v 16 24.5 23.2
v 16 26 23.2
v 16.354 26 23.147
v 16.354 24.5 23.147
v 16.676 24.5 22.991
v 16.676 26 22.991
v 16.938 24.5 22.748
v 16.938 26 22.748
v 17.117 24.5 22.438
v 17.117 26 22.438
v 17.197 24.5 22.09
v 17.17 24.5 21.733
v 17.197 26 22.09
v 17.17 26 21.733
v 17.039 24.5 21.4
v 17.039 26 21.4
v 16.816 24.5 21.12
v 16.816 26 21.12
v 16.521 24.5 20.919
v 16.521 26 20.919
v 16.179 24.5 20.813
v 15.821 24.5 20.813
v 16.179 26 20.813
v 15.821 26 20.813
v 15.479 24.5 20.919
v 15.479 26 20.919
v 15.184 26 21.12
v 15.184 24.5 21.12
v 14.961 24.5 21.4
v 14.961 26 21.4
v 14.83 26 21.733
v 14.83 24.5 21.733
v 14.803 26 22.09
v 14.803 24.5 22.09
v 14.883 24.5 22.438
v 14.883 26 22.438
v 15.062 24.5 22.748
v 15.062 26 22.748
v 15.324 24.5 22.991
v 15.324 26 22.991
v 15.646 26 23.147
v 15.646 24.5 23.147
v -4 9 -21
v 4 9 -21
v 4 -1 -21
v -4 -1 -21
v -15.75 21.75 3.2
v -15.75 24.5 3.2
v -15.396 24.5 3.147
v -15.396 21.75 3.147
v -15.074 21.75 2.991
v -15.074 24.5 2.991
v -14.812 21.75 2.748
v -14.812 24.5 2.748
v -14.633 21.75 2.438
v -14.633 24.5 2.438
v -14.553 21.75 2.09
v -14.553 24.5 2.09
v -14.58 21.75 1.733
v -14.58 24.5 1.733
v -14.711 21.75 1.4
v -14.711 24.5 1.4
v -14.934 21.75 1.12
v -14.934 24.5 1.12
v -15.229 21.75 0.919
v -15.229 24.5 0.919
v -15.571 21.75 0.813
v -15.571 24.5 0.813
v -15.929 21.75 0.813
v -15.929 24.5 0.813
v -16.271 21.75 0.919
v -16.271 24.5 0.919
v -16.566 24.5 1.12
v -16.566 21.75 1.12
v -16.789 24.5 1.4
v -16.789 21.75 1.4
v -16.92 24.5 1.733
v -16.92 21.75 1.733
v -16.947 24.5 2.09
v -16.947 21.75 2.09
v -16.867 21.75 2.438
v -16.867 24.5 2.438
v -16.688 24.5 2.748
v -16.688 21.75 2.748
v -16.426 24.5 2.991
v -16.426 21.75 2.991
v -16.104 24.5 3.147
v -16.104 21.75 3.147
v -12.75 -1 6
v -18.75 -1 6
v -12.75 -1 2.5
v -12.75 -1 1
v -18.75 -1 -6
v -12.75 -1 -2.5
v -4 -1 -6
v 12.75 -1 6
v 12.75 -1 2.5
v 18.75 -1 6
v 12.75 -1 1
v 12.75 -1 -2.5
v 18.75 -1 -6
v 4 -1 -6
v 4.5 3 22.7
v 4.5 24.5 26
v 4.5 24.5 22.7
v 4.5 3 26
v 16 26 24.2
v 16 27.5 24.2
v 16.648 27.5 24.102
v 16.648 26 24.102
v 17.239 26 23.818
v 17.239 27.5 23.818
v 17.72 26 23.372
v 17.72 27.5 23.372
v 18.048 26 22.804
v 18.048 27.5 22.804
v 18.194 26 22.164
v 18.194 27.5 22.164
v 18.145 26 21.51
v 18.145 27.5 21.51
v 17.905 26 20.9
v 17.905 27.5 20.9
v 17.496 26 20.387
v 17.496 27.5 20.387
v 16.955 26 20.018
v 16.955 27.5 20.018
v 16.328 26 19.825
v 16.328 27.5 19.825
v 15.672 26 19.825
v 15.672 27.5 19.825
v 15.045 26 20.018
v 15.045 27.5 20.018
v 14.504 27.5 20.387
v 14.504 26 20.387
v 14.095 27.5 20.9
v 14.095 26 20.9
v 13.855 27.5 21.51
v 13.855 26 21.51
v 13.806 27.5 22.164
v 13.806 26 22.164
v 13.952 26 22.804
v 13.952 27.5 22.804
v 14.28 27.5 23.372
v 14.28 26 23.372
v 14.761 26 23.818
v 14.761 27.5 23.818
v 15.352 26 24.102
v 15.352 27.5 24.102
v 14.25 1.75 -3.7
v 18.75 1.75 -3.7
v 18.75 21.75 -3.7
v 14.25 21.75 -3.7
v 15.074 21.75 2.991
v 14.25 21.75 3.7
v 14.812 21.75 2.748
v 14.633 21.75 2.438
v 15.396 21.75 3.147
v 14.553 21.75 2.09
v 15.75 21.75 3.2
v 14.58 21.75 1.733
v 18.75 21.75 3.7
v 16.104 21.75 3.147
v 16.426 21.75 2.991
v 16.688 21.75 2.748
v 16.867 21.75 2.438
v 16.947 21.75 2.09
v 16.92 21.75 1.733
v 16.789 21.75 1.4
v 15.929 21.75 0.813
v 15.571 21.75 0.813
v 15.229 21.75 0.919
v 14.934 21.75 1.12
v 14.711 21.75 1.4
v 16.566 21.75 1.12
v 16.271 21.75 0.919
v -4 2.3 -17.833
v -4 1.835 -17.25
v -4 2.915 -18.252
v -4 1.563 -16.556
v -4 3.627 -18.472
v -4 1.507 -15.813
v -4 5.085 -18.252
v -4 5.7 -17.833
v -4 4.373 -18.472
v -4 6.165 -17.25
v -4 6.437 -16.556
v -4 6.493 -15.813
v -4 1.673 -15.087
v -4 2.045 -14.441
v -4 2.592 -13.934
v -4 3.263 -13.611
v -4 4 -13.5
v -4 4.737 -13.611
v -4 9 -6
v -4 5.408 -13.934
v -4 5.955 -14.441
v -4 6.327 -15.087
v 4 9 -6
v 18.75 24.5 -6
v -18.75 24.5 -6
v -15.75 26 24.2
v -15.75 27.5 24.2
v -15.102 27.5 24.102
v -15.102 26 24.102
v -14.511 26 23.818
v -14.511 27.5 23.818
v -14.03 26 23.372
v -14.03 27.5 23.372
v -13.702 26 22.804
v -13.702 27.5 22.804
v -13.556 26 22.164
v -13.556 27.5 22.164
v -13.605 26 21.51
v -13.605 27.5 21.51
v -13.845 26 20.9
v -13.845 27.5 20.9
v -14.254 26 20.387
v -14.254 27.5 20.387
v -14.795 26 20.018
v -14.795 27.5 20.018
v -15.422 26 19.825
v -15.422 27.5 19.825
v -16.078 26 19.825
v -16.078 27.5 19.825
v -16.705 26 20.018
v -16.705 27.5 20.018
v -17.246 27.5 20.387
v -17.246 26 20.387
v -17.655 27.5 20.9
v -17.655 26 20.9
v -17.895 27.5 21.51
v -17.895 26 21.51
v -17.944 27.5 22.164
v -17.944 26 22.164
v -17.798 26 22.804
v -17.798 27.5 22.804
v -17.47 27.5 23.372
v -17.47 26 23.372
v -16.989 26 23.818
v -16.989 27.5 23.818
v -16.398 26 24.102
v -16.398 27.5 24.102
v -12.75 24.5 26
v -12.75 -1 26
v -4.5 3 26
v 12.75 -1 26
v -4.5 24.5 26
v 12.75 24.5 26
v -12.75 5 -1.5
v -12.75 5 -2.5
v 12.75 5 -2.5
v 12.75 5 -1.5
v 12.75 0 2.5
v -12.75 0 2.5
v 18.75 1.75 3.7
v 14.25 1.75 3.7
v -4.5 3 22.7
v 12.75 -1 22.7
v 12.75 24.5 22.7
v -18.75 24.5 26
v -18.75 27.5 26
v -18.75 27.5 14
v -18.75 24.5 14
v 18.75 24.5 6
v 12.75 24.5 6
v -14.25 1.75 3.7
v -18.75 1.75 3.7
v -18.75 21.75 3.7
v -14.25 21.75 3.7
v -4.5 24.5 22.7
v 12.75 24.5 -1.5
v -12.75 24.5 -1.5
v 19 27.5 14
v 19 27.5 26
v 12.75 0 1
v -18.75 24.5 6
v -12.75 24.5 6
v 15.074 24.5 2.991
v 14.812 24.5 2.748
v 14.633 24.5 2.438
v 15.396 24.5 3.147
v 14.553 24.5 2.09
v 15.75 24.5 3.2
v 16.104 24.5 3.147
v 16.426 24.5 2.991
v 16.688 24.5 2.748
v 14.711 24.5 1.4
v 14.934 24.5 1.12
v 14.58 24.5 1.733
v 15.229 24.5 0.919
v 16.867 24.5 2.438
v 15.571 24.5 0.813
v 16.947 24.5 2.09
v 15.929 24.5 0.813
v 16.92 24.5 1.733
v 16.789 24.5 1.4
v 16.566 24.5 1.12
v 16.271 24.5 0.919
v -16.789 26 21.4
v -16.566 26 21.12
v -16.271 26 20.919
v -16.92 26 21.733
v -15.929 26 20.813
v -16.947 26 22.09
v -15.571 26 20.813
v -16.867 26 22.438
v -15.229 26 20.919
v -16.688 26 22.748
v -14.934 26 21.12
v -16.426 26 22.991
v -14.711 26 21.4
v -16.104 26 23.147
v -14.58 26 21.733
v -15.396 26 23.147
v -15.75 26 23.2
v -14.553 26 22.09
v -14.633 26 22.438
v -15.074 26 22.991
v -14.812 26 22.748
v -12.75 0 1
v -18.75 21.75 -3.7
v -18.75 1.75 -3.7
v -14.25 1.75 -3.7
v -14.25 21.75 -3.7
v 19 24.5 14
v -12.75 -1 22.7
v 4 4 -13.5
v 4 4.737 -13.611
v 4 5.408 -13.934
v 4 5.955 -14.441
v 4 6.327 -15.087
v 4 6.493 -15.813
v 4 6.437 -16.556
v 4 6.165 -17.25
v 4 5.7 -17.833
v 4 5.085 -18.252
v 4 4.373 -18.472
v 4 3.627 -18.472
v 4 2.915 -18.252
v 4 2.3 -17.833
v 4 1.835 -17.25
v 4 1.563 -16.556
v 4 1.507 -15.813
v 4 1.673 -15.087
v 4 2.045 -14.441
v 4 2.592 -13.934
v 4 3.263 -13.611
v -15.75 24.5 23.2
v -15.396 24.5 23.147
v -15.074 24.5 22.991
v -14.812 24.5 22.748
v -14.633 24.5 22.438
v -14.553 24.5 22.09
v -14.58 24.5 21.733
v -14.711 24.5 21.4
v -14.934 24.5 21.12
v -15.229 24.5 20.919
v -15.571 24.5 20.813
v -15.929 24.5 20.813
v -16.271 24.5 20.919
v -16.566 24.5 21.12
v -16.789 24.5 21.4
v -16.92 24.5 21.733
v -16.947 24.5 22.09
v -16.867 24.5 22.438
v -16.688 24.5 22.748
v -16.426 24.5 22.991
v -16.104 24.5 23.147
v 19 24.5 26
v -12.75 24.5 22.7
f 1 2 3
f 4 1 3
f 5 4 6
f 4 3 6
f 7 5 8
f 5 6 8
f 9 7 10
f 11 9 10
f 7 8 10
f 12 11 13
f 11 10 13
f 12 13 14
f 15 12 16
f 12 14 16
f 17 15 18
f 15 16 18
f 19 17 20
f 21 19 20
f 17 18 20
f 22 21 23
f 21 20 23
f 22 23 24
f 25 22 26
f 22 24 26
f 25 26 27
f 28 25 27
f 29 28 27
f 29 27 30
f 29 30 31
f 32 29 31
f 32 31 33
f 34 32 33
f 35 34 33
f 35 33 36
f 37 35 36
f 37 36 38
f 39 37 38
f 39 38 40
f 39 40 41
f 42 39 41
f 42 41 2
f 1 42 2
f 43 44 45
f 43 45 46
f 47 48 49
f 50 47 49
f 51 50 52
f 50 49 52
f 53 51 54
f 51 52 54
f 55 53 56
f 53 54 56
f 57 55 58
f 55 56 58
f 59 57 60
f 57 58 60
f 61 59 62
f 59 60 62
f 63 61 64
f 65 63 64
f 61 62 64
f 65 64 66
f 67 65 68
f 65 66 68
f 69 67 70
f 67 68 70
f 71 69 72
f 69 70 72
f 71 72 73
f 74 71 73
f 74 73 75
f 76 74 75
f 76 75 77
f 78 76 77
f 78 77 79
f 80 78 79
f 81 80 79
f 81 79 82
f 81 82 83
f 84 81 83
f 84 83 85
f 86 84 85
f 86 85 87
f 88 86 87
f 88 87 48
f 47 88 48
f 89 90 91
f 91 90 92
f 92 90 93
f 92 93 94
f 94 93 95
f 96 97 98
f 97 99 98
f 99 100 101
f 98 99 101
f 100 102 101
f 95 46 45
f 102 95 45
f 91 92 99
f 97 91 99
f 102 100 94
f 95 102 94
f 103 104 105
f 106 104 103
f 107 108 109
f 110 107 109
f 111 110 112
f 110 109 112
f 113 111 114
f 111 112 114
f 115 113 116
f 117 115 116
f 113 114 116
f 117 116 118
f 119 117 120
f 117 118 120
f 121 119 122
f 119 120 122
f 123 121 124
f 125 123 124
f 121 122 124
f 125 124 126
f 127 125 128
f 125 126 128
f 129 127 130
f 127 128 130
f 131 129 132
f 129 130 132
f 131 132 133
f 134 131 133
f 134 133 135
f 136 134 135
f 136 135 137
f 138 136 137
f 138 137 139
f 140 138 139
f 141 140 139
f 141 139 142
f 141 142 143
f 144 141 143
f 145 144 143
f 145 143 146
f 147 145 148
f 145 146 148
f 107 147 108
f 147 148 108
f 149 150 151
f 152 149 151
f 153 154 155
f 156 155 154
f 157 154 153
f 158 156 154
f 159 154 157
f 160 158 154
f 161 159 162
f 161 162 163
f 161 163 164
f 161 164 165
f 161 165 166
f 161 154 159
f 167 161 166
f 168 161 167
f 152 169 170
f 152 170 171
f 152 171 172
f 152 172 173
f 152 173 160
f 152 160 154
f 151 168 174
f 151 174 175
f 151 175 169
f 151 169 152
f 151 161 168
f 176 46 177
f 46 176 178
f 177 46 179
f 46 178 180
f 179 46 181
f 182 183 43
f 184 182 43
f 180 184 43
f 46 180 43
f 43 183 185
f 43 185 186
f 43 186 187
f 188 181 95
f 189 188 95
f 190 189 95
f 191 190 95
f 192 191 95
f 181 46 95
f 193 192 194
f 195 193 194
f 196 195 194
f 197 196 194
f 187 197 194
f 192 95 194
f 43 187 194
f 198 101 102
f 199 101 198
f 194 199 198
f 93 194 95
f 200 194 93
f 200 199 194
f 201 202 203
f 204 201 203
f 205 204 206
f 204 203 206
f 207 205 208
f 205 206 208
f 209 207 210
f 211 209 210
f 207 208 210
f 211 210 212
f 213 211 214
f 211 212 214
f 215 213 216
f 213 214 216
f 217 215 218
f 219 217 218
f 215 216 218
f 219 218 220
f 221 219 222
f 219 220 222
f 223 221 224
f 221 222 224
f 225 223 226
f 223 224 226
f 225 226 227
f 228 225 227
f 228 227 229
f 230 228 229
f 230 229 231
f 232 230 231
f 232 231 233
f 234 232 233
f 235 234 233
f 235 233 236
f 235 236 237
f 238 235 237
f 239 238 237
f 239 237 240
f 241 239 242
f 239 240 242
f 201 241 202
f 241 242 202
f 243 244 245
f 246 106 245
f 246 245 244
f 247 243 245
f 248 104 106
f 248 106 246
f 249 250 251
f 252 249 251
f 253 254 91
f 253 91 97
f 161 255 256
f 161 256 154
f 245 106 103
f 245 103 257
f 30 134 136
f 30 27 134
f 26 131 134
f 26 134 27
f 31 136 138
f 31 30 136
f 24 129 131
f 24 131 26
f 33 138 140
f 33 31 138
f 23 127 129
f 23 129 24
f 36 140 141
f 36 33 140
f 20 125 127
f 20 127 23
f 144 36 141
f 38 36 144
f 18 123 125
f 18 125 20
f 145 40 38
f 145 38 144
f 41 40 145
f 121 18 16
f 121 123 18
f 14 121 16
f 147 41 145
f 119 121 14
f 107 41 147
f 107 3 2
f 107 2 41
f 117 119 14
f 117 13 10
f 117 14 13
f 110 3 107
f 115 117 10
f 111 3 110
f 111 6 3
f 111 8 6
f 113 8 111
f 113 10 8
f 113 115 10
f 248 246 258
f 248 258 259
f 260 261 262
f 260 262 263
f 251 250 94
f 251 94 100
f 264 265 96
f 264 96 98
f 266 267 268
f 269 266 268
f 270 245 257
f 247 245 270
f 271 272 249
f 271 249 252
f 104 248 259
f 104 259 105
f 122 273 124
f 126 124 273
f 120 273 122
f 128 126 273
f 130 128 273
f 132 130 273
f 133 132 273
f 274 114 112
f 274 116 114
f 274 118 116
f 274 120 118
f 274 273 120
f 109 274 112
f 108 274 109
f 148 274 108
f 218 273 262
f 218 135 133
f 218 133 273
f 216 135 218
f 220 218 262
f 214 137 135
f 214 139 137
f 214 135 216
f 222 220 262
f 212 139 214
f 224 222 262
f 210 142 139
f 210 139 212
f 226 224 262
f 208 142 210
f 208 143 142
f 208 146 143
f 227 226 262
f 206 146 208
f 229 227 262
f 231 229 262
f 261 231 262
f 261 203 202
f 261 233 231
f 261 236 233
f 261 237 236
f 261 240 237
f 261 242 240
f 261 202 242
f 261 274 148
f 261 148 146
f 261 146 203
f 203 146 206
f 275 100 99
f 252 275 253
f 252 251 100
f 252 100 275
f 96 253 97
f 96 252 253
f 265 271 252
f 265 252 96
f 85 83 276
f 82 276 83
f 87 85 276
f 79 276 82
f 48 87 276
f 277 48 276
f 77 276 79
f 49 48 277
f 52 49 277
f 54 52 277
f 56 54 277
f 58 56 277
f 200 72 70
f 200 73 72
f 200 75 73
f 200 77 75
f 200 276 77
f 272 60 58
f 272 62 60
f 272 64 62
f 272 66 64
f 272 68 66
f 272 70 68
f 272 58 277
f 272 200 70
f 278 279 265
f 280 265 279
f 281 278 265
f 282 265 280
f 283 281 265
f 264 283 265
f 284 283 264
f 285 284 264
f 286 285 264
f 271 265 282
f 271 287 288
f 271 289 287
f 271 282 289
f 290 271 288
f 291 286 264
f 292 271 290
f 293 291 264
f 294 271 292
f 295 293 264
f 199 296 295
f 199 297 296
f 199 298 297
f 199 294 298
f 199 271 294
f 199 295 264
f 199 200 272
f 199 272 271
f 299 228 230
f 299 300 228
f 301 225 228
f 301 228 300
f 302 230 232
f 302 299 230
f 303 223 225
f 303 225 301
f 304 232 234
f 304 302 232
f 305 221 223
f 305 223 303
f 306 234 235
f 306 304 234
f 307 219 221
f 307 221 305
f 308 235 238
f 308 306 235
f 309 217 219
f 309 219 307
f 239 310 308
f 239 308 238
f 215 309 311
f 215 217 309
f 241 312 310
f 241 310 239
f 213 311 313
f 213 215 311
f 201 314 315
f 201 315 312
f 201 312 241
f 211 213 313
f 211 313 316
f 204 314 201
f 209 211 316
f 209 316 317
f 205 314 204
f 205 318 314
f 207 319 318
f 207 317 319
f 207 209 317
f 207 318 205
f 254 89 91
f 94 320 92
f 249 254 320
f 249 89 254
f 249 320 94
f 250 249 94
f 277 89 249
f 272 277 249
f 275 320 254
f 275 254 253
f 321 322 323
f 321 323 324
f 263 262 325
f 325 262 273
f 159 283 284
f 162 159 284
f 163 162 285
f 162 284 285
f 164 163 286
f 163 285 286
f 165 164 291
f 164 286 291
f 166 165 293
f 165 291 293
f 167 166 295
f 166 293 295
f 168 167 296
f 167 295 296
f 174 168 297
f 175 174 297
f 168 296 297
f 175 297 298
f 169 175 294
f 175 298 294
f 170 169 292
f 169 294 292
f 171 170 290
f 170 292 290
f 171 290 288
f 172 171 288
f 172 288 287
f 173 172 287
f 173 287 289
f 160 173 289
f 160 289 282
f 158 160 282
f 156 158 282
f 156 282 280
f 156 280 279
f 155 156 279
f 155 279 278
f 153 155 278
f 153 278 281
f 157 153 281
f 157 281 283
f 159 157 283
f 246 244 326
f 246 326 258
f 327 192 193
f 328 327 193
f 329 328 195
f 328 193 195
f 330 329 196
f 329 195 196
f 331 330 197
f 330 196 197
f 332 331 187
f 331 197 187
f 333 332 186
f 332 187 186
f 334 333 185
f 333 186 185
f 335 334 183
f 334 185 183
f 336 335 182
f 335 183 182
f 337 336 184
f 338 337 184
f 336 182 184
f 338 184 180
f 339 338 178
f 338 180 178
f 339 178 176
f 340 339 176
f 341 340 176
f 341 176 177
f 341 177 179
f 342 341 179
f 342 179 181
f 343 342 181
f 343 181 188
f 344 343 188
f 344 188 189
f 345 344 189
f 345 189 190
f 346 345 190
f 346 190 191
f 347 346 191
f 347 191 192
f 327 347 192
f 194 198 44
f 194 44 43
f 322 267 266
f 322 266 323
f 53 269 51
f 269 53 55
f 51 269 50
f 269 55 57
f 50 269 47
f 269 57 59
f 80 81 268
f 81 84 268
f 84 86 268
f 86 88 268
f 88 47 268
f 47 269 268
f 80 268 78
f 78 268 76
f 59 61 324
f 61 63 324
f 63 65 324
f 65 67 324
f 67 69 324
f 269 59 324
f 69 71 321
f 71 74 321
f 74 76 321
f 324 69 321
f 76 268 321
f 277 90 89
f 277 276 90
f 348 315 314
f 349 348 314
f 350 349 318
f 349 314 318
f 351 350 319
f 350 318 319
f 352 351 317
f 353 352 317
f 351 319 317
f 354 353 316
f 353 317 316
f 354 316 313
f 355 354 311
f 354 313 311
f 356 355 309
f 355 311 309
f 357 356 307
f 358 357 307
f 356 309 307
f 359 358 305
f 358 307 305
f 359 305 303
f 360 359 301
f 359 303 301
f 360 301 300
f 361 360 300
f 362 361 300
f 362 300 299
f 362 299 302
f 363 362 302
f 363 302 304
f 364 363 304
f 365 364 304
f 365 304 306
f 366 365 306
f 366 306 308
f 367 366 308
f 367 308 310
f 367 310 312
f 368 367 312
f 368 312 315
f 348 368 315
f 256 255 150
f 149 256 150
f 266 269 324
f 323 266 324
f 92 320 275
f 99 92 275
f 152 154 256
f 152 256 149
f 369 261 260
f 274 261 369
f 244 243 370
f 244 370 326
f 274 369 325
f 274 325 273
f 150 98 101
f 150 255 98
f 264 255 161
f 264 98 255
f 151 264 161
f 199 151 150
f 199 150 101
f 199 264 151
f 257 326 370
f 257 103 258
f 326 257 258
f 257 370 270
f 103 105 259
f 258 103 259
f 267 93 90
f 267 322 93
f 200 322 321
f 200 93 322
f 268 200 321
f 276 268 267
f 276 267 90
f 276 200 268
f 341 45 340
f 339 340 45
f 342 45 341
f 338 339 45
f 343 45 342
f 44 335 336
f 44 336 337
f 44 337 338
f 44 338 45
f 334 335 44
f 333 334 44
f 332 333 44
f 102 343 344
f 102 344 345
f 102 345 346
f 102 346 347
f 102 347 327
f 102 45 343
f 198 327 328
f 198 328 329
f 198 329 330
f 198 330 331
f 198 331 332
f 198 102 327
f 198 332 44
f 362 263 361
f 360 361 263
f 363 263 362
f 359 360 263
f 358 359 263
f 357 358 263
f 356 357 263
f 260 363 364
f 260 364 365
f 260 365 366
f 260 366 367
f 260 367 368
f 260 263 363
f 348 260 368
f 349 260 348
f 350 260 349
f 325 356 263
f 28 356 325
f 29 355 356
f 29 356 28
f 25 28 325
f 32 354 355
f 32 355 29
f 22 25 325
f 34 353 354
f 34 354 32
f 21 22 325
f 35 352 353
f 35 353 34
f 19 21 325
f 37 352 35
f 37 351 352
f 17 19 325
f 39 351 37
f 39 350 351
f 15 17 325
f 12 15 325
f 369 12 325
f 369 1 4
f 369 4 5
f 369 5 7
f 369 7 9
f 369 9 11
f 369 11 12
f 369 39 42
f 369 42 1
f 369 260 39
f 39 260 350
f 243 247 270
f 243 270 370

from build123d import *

# Parameters (mm, degrees)
SKETCH1_W           = 25.5
SKETCH1_H           = 3.5
BOSS_EXTRUDE1_DEPTH = 24.5
SKETCH1_3_W         = 25.5
SKETCH1_3_H         = 1.5
SKETCH1_3_H_2       = 3.5
BOSS_EXTRUDE2_DEPTH = 1
SKETCH2_R           = 1.2
CUT_EXTRUDE1_DEPTH  = 14.5
SKETCH5_W           = 7.4
SKETCH5_H           = 20
CUT_EXTRUDE3_DEPTH  = 4.5
BOSS_EXTRUDE3_START = 20
BOSS_EXTRUDE3_DEPTH = 3.3
BOSS_EXTRUDE4_START = 20
BOSS_EXTRUDE4_DEPTH = 12
SKETCH8_R           = 2.2
SKETCH8_R_2         = 1.2
CUT_EXTRUDE5_DEPTH  = 1.5
SKETCH8_3_R         = 1.2
CUT_EXTRUDE6_DEPTH  = 3
CUT_EXTRUDE7_START  = -37.5
SKETCH5_2_W         = 7.4
SKETCH5_2_H         = 20
CUT_EXTRUDE7_DEPTH  = 4.5
SKETCH9_W           = 25.5
SKETCH9_H           = 19.5
BOSS_EXTRUDE5_DEPTH = 1
SKETCH10_W          = 8
SKETCH10_H          = 10
BOSS_EXTRUDE6_DEPTH = 15
SKETCH11_R          = 2.5
CUT_EXTRUDE8_DEPTH  = 45.286002303


with BuildPart() as part:
    # Sketch1 → Boss-Extrude1 (new body)
    with BuildSketch(Plane(origin=(0, 0, 0), x_dir=(1, 0, 0), z_dir=(0, 1, 0))):
        Polygon((-12.75, -2.5), (-12.75, -1), (-12.75, 2.5), (-12.75, 6), (-18.75, 6), (-18.75, -6), (-12.75, -6), align=None)
        with Locations((0, 4.25)):
            Rectangle(SKETCH1_W, SKETCH1_H)
        Polygon((12.75, 2.5), (12.75, -1), (12.75, -2.5), (12.75, -6), (18.75, -6), (18.75, 6), (12.75, 6), align=None)
    extrude(amount=BOSS_EXTRUDE1_DEPTH)

    # Sketch1<3> → Boss-Extrude2 (add)
    with BuildSketch(Plane(origin=(0, 0, 0), x_dir=(1, 0, 0), z_dir=(0, 1, 0))):
        with Locations((0, -1.75)):
            Rectangle(SKETCH1_3_W, SKETCH1_3_H)
        Polygon((-12.75, -2.5), (-12.75, -1), (-12.75, 2.5), (-12.75, 6), (-18.75, 6), (-18.75, -6), (-12.75, -6), align=None)
        with Locations((0, 4.25)):
            Rectangle(SKETCH1_3_W, SKETCH1_3_H_2)
        Polygon((12.75, 2.5), (12.75, -1), (12.75, -2.5), (12.75, -6), (18.75, -6), (18.75, 6), (12.75, 6), align=None)
    extrude(amount=-BOSS_EXTRUDE2_DEPTH)

    # Sketch2 → Cut-Extrude1 (cut)
    with BuildSketch(Plane(origin=(0, 24.5, 0), x_dir=(1, 0, 0), z_dir=(0, 1, 0))):
        with Locations(Location((-15.75, -2, 0), (0, 0, 270))):
            Circle(SKETCH2_R)
        with Locations(Location((15.75, -2, 0), (0, 0, 270))):
            Circle(SKETCH2_R)
    extrude(amount=-CUT_EXTRUDE1_DEPTH, mode=Mode.SUBTRACT)

    # Sketch5 → Cut-Extrude3 (cut)
    with BuildSketch(Plane(origin=(18.75, 0, 0), x_dir=(0, 0, -1), z_dir=(1, 0, 0))):
        with Locations((0, 11.75)):
            Rectangle(SKETCH5_W, SKETCH5_H)
    extrude(amount=-CUT_EXTRUDE3_DEPTH, mode=Mode.SUBTRACT)

    # Sketch5<2> → Cut-Extrude7 (cut)
    with BuildSketch(Plane(origin=(18.75, 0, 0), x_dir=(0, 0, -1), z_dir=(1, 0, 0)).offset(CUT_EXTRUDE7_START)):
        with Locations((0, 11.75)):
            Rectangle(SKETCH5_2_W, SKETCH5_2_H)
    extrude(amount=CUT_EXTRUDE7_DEPTH, mode=Mode.SUBTRACT)

    # Sketch9 → Boss-Extrude5 (add)
    with BuildSketch(Plane.XY.offset(-2.5)):
        with Locations((0, 14.75)):
            Rectangle(SKETCH9_W, SKETCH9_H)
    extrude(amount=BOSS_EXTRUDE5_DEPTH)

    # Sketch10 → Boss-Extrude6 (add)
    with BuildSketch(Plane(origin=(0, 0, -6), x_dir=(-1, 0, 0), z_dir=(0, 0, -1))):
        with Locations((0, 4)):
            Rectangle(SKETCH10_W, SKETCH10_H)
    extrude(amount=BOSS_EXTRUDE6_DEPTH)

    # Sketch11 → Cut-Extrude8 (cut, through all)
    with BuildSketch(Plane.ZY.offset(4)):
        with Locations((-16, 4)):
            Circle(SKETCH11_R)
    extrude(amount=-CUT_EXTRUDE8_DEPTH, mode=Mode.SUBTRACT)


with BuildPart() as body_2:
    # Sketch7 → Boss-Extrude3 (new body)
    with BuildSketch(Plane.XY.offset(6).offset(BOSS_EXTRUDE3_START)):
        Polygon((-4.5, 24.5), (-12.75, 24.5), (-12.75, -1), (12.75, -1), (12.75, 24.5), (4.5, 24.5), (4.5, 15.5), (4.5, 3), (-4.5, 3), (-4.5, 15.5), align=None)
    extrude(amount=-BOSS_EXTRUDE3_DEPTH)


with BuildPart() as body_3:
    # Sketch7<3> → Boss-Extrude4 (new body)
    with BuildSketch(Plane.XY.offset(6).offset(BOSS_EXTRUDE4_START)):
        Polygon((-18.75, 24.5), (-12.75, 24.5), (-4.5, 24.5), (4.5, 24.5), (12.75, 24.5), (19, 24.5), (19, 27.5), (-18.75, 27.5), align=None)
    extrude(amount=-BOSS_EXTRUDE4_DEPTH)

    # Sketch8 → Cut-Extrude5 (cut)
    # profile 1 of 2: a face of its own
    with BuildSketch(Plane(origin=(0, 27.5, 0), x_dir=(1, 0, 0), z_dir=(0, 1, 0))):
        with Locations(Location((-15.75, -22, 0), (0, 0, 270))):
            Circle(SKETCH8_R)
    # profile 2 of 2: a face of its own
    with BuildSketch(Plane(origin=(0, 27.5, 0), x_dir=(1, 0, 0), z_dir=(0, 1, 0))):
        with Locations(Location((16, -22, 0), (0, 0, 270))):
            Circle(SKETCH8_R)
        with Locations(Location((16, -22, 0), (0, 0, 270))):
            Circle(SKETCH8_R_2, mode=Mode.SUBTRACT)
    extrude(amount=-CUT_EXTRUDE5_DEPTH, mode=Mode.SUBTRACT)

    # Sketch8<3> → Cut-Extrude6 (cut)
    with BuildSketch(Plane(origin=(0, 27.5, 0), x_dir=(1, 0, 0), z_dir=(0, 1, 0))):
        with Locations(Location((-15.75, -22, 0), (0, 0, 270))):
            Circle(SKETCH8_3_R)
        with Locations(Location((16, -22, 0), (0, 0, 270))):
            Circle(SKETCH8_3_R)
    extrude(amount=-CUT_EXTRUDE6_DEPTH, mode=Mode.SUBTRACT)


solid = Compound([part.part, body_2.part, body_3.part])
